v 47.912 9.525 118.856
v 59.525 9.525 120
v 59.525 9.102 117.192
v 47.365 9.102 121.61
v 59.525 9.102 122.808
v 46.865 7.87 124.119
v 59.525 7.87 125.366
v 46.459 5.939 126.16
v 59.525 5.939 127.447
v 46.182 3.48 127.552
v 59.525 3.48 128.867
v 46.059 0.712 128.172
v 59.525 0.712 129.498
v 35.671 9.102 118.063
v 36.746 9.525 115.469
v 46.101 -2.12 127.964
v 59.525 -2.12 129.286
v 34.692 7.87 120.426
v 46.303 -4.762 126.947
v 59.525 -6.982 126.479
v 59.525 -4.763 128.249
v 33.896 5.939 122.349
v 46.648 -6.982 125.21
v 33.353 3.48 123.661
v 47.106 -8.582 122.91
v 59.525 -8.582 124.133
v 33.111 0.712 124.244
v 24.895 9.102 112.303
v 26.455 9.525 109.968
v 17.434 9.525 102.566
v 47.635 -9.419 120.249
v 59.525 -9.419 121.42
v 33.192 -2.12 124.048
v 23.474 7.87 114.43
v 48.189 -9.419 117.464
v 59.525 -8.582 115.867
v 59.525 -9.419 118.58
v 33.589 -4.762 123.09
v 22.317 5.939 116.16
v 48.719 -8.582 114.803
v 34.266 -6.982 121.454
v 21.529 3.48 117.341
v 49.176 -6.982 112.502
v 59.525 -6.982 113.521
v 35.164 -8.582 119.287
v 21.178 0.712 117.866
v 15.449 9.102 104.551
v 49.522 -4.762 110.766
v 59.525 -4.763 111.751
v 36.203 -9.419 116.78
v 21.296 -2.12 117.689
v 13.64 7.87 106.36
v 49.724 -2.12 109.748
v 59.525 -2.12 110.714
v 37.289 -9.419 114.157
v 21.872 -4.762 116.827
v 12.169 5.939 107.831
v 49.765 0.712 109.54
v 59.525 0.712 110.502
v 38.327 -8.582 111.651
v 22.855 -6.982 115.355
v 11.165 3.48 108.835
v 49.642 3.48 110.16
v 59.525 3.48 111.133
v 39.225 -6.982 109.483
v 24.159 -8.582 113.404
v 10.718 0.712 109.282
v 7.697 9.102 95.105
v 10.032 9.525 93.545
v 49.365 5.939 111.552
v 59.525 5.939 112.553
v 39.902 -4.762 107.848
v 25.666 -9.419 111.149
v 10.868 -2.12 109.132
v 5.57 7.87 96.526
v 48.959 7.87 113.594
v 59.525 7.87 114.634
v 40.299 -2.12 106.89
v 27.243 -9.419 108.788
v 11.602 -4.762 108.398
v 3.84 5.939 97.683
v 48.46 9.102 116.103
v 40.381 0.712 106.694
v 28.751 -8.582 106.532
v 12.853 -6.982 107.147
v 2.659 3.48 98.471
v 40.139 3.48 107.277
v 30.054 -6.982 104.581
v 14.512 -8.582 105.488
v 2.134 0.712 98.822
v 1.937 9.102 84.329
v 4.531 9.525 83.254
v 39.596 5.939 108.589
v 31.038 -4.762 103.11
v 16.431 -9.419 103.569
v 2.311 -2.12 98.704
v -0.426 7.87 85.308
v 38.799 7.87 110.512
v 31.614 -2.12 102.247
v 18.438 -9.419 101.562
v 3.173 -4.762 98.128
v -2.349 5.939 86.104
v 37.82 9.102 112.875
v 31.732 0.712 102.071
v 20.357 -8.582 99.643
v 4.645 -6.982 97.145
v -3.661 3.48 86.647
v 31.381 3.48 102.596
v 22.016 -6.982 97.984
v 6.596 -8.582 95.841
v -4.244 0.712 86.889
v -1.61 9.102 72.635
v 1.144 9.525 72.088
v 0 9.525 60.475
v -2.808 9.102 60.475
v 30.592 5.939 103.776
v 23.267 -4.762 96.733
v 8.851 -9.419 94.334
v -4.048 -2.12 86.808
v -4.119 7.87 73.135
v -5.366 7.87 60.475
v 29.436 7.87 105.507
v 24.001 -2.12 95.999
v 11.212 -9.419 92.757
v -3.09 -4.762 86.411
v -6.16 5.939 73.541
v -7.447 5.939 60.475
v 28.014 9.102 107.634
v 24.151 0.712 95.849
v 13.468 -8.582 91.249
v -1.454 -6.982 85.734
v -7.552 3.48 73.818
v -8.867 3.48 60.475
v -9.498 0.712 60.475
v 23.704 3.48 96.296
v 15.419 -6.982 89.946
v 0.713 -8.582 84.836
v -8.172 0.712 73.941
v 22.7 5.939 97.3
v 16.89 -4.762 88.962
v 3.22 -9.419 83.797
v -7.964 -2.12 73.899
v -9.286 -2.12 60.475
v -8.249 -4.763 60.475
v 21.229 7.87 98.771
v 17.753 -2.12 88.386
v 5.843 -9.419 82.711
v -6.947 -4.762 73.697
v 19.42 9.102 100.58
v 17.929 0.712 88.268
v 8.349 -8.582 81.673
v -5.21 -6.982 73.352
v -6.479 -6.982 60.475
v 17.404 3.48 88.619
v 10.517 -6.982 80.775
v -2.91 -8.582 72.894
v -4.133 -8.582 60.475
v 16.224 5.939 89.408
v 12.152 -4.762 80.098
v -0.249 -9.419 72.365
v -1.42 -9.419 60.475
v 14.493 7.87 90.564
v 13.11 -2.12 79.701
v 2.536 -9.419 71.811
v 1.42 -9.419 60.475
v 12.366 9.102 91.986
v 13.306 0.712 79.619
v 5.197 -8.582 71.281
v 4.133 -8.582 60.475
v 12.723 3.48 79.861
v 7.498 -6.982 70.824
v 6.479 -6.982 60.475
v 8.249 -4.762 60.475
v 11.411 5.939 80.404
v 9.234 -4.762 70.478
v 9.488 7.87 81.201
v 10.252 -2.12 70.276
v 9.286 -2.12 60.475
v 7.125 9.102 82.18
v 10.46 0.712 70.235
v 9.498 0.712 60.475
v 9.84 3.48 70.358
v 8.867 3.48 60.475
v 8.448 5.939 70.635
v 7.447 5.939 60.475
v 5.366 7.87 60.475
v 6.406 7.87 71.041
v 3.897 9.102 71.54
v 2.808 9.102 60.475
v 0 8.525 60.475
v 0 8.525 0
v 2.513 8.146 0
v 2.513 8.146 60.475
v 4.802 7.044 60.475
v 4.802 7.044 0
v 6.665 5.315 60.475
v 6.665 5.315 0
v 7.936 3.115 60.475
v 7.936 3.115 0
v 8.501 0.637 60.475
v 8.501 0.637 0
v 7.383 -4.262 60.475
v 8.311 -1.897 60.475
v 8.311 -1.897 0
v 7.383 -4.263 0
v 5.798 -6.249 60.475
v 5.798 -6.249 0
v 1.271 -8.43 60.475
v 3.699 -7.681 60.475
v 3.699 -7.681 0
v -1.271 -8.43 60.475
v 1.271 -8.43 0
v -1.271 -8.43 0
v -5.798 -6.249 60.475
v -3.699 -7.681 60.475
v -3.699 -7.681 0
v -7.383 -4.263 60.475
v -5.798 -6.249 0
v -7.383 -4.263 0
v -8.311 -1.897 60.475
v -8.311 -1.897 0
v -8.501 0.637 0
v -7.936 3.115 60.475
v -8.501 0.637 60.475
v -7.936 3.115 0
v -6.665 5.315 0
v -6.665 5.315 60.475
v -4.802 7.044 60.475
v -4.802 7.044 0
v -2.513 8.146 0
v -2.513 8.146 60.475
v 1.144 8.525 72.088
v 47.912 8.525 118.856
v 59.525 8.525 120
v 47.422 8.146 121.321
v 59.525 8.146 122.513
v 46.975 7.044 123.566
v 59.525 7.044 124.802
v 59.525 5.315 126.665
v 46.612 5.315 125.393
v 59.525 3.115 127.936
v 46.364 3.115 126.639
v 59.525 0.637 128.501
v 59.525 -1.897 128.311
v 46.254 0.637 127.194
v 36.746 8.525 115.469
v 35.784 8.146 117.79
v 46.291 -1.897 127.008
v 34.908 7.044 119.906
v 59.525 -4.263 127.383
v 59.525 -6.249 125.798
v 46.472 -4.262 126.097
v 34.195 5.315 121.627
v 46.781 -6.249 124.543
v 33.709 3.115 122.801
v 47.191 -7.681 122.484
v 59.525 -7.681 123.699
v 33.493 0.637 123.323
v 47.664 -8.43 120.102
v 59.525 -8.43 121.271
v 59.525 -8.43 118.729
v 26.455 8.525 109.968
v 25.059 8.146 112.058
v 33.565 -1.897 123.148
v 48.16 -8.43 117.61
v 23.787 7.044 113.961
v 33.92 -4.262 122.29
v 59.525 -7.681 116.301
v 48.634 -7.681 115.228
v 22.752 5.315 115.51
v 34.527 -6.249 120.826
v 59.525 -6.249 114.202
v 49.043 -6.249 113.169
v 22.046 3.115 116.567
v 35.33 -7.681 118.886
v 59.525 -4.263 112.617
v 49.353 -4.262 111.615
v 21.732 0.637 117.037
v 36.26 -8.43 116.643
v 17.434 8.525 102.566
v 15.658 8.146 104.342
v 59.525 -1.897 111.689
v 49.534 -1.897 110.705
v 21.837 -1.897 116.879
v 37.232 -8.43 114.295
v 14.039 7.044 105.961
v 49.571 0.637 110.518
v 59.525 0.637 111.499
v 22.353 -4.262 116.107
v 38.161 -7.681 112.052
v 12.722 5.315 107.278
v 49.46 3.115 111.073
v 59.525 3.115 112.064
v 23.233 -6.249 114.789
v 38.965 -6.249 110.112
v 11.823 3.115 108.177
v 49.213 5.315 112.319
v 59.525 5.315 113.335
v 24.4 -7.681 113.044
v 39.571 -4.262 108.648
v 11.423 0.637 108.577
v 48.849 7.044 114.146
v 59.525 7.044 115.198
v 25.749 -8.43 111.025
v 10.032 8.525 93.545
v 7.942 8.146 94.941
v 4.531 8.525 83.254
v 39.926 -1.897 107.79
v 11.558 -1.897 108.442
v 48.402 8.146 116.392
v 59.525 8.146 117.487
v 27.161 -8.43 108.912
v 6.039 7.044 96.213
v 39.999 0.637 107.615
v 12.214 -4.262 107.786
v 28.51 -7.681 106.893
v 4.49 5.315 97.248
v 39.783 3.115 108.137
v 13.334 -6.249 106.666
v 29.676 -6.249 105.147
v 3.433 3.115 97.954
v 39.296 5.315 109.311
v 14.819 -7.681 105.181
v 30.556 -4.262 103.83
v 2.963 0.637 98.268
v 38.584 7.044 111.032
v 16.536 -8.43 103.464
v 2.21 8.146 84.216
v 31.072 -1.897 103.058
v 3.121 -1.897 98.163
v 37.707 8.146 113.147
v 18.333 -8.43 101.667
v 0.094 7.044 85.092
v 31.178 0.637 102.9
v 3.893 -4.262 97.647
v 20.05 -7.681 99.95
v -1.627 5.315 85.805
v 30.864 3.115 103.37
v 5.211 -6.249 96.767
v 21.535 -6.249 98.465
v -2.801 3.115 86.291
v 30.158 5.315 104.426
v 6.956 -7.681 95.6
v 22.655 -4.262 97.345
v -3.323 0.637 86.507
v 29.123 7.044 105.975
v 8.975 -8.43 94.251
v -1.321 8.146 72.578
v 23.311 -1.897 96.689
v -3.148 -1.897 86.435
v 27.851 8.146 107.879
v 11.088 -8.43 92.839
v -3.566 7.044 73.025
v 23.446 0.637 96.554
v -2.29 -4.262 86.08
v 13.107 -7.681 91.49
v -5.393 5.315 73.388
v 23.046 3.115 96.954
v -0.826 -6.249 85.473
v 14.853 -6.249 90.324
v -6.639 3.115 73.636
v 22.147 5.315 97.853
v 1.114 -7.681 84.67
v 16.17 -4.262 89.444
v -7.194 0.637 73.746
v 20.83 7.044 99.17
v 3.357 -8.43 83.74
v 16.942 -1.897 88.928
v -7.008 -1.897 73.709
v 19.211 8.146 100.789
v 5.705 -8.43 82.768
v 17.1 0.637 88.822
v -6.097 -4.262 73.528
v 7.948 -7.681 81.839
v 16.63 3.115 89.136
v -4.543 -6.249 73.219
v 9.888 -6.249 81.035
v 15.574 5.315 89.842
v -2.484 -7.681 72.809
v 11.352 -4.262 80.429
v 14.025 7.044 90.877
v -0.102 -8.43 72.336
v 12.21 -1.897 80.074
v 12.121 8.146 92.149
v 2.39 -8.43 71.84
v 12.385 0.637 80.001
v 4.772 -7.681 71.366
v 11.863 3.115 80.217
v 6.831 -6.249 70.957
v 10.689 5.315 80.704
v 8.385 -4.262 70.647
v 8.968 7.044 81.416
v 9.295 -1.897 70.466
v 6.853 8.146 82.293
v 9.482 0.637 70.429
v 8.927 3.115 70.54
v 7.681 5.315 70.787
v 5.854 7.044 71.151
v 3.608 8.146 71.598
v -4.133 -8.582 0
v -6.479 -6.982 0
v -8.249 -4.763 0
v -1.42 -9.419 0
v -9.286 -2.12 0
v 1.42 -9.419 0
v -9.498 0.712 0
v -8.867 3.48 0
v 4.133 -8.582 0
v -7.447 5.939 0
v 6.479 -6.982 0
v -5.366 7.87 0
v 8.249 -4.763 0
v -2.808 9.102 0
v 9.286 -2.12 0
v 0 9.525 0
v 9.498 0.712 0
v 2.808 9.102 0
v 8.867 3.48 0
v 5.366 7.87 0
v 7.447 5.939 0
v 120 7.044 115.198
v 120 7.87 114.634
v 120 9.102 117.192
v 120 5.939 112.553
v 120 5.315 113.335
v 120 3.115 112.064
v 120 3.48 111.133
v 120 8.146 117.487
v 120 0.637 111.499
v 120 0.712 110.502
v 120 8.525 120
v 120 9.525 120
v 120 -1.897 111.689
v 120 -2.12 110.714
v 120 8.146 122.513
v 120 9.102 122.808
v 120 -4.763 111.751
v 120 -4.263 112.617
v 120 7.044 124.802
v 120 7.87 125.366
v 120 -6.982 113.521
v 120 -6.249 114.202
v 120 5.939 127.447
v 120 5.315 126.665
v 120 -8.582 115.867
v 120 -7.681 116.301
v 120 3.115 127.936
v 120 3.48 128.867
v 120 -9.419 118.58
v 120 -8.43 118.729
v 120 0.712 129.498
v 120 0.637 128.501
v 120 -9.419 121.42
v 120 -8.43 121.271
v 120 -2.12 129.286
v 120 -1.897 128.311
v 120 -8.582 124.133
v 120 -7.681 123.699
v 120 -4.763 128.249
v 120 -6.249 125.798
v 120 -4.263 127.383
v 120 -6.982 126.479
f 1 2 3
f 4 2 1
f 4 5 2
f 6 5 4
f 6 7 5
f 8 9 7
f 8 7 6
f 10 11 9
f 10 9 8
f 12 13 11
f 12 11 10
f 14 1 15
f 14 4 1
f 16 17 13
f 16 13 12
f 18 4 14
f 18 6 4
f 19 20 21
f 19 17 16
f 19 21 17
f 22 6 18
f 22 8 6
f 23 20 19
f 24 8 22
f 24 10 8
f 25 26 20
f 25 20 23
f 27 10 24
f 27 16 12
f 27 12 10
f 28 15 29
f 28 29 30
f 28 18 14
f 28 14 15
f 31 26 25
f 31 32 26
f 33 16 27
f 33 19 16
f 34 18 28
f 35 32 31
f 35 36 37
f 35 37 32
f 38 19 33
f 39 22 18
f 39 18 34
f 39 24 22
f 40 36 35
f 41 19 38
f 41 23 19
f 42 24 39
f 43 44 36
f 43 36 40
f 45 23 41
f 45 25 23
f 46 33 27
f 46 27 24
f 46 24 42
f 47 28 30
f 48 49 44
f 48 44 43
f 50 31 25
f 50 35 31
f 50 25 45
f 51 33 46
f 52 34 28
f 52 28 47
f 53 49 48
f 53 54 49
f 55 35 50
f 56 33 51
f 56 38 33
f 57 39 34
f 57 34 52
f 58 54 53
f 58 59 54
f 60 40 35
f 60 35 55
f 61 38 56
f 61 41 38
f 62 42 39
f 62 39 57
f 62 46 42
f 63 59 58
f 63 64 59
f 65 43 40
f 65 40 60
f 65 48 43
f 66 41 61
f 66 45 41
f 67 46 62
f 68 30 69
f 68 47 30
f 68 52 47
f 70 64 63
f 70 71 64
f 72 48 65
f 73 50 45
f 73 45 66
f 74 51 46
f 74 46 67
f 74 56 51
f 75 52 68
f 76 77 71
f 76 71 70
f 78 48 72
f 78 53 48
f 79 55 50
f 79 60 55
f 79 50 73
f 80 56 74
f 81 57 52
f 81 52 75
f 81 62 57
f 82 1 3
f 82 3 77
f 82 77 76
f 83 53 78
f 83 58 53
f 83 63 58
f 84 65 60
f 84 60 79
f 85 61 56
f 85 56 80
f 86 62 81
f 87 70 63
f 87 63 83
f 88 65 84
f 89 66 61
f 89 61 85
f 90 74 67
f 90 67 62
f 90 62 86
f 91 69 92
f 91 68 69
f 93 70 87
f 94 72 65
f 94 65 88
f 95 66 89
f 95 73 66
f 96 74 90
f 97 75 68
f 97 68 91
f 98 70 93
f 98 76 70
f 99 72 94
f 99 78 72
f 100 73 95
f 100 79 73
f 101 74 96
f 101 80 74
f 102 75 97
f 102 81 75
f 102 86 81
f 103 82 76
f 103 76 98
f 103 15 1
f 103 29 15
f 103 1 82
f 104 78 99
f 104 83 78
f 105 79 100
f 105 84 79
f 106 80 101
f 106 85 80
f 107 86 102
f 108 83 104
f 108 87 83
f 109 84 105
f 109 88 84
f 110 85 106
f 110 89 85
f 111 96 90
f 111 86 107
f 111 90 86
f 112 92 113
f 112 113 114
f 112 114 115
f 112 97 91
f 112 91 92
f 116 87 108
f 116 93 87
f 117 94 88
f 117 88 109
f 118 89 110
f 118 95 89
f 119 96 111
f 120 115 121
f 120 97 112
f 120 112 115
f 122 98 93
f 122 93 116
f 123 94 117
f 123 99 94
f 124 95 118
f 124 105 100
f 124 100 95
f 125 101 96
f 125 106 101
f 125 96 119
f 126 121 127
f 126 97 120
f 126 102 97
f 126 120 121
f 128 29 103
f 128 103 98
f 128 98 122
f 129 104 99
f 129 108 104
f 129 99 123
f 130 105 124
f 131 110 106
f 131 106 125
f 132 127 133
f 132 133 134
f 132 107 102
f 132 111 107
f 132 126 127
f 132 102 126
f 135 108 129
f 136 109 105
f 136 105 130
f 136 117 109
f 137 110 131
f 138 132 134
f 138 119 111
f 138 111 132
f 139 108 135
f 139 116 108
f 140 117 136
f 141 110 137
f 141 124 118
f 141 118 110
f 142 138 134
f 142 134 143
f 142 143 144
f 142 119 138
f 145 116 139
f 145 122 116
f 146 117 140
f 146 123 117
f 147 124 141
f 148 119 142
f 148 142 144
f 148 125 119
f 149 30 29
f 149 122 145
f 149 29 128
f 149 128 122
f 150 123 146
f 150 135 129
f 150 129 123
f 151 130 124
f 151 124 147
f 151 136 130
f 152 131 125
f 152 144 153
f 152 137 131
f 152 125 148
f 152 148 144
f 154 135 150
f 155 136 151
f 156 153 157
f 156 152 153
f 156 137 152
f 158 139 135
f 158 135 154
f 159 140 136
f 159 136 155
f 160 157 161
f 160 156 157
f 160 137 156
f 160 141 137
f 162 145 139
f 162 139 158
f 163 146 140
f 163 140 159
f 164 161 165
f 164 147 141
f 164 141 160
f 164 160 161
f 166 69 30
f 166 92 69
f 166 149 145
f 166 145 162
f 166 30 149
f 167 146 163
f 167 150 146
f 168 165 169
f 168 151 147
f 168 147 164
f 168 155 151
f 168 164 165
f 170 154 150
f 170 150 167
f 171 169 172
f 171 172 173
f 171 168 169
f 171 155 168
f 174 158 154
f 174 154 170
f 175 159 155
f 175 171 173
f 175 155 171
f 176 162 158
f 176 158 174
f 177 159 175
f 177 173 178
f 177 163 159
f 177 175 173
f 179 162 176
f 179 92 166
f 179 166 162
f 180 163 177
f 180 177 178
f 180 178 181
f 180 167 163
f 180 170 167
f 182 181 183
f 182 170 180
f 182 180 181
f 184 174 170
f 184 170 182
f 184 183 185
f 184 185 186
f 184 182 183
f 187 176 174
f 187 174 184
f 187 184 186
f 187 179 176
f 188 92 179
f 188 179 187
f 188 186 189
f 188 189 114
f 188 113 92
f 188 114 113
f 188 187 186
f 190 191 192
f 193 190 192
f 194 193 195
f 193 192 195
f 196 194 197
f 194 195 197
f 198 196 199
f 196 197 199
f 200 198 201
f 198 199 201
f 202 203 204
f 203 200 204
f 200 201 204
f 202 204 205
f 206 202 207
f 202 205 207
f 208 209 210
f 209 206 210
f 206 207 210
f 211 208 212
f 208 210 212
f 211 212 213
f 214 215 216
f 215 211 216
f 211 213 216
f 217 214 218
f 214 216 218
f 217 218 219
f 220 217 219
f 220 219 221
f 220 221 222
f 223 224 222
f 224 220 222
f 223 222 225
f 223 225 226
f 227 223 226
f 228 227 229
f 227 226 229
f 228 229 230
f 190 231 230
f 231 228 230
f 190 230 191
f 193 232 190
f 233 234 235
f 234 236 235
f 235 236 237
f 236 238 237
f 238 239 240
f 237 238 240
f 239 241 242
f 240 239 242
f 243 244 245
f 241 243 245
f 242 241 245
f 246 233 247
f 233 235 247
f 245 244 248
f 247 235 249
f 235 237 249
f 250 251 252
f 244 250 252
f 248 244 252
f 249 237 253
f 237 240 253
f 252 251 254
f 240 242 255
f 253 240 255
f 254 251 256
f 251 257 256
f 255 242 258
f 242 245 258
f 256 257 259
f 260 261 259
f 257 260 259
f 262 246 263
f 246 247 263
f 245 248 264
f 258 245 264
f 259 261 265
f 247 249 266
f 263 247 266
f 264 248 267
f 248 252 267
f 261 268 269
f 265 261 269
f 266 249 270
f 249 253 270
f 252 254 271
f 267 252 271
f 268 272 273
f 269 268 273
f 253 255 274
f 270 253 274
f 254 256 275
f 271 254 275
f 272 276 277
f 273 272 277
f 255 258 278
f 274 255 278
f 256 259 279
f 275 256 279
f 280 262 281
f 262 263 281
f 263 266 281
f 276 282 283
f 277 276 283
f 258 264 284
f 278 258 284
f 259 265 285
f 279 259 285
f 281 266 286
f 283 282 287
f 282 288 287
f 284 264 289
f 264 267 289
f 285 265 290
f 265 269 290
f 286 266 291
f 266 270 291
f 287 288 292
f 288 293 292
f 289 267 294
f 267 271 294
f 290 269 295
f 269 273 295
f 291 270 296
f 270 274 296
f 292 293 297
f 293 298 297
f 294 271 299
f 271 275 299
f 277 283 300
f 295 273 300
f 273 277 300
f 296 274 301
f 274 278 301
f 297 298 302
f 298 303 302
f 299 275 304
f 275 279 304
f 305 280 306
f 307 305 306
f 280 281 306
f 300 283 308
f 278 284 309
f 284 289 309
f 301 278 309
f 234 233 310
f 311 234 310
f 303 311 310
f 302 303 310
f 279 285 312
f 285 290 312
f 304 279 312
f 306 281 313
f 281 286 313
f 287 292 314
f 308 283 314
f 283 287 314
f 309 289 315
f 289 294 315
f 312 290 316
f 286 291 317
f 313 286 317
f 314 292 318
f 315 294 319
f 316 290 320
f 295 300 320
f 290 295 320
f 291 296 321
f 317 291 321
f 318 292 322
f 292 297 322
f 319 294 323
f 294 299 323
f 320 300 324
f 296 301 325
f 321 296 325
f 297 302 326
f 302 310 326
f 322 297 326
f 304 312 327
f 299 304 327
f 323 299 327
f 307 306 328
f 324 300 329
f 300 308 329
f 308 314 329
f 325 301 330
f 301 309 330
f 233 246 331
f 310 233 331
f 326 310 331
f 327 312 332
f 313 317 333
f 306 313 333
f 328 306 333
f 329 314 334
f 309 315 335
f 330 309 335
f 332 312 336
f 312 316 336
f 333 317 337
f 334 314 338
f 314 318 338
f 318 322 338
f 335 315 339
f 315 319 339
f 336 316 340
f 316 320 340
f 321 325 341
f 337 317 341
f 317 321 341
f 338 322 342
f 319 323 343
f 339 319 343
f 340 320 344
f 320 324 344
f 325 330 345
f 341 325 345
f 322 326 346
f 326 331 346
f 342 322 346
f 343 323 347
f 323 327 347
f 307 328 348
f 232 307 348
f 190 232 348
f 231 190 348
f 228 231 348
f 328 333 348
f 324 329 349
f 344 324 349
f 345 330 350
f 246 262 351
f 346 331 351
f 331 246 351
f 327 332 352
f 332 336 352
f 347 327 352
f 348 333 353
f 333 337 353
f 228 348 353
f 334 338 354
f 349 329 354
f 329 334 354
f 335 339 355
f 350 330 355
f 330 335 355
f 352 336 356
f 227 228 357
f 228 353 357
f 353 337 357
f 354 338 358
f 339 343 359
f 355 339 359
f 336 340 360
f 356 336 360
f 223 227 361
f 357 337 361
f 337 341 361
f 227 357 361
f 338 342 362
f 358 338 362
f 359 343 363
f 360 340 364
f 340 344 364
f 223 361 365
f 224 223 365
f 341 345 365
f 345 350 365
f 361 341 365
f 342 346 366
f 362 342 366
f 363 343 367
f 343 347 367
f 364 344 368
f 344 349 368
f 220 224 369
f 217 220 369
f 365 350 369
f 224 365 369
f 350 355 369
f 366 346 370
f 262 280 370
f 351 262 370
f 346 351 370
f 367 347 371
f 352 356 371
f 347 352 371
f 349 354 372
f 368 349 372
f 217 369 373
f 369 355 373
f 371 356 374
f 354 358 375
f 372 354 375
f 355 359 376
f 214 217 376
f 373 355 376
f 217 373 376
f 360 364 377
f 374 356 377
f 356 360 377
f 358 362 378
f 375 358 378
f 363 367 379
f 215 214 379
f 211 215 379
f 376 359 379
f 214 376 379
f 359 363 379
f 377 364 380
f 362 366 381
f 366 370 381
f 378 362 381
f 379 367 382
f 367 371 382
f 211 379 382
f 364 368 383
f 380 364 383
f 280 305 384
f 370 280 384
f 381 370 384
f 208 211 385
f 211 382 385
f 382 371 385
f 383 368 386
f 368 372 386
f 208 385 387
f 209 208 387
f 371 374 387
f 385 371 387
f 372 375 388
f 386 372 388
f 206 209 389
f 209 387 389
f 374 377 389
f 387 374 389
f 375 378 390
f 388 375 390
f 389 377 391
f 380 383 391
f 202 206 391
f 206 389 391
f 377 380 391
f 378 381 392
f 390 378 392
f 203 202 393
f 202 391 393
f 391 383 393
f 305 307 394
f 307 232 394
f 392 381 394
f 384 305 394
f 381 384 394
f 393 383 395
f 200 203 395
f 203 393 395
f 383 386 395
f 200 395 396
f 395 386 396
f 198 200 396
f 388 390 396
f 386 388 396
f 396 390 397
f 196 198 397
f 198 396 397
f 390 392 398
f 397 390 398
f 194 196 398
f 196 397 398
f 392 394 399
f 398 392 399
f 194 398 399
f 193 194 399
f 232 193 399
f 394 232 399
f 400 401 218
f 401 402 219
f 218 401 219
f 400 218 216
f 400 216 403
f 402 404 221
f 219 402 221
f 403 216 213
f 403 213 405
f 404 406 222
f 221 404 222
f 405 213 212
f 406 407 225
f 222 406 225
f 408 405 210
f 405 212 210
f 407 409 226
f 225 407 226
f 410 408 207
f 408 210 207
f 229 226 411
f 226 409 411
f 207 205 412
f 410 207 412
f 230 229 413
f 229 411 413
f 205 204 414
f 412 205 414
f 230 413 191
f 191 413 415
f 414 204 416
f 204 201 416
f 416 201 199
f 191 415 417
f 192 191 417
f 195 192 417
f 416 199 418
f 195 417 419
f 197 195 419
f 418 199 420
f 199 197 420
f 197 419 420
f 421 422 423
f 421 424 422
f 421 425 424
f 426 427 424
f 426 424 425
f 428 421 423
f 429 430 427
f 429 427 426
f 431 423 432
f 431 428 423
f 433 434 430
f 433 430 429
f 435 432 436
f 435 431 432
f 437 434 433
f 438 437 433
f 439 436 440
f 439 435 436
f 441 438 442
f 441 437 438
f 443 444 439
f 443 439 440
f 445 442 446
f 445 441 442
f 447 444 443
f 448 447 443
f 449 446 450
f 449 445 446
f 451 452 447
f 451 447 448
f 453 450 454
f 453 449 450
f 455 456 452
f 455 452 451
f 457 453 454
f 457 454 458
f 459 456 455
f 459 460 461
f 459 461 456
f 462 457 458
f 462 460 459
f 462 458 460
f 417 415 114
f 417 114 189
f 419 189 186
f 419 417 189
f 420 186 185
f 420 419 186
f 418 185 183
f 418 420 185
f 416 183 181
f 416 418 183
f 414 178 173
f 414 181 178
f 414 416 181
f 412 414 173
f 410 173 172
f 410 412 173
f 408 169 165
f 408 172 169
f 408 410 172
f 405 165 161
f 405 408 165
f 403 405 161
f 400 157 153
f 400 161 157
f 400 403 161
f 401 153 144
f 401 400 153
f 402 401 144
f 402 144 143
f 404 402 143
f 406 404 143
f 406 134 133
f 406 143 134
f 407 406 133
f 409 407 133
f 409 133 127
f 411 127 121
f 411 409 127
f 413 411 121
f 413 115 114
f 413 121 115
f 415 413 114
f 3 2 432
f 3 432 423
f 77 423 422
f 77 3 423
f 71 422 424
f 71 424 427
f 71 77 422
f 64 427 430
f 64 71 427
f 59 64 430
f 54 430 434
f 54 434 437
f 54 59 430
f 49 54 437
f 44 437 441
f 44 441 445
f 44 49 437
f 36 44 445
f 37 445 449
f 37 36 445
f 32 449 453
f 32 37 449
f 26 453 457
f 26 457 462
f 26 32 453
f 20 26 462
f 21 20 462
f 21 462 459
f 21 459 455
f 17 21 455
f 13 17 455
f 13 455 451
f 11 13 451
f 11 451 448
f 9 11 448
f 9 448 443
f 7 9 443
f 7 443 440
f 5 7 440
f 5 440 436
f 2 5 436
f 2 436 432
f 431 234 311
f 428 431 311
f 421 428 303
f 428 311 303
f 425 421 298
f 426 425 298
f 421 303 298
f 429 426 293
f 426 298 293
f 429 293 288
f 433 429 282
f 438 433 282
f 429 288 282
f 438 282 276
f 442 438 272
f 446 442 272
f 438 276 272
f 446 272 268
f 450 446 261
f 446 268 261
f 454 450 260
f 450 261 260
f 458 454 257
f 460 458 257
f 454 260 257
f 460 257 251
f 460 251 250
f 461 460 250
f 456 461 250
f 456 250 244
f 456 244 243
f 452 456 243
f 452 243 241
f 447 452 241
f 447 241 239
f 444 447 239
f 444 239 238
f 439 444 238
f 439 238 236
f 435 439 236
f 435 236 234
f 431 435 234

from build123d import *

# Parameters (mm, degrees)
F2_R   = 9.525
F2_R_2 = 8.525


with BuildPart() as f3:
    # F3: sweep along a path in F0
    with BuildLine(Plane.XZ) as f3_path:
        Line((120, 120), (59.525, 120))
        ThreePointArc((59.525, 120), (17.4344688499, 102.5655311501), (0, 60.475))
        Line((0, 60.475), (0, 0))
    # F2 (on plane+point) → F3 (sweep)
    with BuildSketch(Plane.YZ.offset(120)):
        with Locations((0, 120)):
            Circle(F2_R)
        with Locations((0, 120)):
            Circle(F2_R_2, mode=Mode.SUBTRACT)
    sweep(path=f3_path.line)


solid = f3.part
